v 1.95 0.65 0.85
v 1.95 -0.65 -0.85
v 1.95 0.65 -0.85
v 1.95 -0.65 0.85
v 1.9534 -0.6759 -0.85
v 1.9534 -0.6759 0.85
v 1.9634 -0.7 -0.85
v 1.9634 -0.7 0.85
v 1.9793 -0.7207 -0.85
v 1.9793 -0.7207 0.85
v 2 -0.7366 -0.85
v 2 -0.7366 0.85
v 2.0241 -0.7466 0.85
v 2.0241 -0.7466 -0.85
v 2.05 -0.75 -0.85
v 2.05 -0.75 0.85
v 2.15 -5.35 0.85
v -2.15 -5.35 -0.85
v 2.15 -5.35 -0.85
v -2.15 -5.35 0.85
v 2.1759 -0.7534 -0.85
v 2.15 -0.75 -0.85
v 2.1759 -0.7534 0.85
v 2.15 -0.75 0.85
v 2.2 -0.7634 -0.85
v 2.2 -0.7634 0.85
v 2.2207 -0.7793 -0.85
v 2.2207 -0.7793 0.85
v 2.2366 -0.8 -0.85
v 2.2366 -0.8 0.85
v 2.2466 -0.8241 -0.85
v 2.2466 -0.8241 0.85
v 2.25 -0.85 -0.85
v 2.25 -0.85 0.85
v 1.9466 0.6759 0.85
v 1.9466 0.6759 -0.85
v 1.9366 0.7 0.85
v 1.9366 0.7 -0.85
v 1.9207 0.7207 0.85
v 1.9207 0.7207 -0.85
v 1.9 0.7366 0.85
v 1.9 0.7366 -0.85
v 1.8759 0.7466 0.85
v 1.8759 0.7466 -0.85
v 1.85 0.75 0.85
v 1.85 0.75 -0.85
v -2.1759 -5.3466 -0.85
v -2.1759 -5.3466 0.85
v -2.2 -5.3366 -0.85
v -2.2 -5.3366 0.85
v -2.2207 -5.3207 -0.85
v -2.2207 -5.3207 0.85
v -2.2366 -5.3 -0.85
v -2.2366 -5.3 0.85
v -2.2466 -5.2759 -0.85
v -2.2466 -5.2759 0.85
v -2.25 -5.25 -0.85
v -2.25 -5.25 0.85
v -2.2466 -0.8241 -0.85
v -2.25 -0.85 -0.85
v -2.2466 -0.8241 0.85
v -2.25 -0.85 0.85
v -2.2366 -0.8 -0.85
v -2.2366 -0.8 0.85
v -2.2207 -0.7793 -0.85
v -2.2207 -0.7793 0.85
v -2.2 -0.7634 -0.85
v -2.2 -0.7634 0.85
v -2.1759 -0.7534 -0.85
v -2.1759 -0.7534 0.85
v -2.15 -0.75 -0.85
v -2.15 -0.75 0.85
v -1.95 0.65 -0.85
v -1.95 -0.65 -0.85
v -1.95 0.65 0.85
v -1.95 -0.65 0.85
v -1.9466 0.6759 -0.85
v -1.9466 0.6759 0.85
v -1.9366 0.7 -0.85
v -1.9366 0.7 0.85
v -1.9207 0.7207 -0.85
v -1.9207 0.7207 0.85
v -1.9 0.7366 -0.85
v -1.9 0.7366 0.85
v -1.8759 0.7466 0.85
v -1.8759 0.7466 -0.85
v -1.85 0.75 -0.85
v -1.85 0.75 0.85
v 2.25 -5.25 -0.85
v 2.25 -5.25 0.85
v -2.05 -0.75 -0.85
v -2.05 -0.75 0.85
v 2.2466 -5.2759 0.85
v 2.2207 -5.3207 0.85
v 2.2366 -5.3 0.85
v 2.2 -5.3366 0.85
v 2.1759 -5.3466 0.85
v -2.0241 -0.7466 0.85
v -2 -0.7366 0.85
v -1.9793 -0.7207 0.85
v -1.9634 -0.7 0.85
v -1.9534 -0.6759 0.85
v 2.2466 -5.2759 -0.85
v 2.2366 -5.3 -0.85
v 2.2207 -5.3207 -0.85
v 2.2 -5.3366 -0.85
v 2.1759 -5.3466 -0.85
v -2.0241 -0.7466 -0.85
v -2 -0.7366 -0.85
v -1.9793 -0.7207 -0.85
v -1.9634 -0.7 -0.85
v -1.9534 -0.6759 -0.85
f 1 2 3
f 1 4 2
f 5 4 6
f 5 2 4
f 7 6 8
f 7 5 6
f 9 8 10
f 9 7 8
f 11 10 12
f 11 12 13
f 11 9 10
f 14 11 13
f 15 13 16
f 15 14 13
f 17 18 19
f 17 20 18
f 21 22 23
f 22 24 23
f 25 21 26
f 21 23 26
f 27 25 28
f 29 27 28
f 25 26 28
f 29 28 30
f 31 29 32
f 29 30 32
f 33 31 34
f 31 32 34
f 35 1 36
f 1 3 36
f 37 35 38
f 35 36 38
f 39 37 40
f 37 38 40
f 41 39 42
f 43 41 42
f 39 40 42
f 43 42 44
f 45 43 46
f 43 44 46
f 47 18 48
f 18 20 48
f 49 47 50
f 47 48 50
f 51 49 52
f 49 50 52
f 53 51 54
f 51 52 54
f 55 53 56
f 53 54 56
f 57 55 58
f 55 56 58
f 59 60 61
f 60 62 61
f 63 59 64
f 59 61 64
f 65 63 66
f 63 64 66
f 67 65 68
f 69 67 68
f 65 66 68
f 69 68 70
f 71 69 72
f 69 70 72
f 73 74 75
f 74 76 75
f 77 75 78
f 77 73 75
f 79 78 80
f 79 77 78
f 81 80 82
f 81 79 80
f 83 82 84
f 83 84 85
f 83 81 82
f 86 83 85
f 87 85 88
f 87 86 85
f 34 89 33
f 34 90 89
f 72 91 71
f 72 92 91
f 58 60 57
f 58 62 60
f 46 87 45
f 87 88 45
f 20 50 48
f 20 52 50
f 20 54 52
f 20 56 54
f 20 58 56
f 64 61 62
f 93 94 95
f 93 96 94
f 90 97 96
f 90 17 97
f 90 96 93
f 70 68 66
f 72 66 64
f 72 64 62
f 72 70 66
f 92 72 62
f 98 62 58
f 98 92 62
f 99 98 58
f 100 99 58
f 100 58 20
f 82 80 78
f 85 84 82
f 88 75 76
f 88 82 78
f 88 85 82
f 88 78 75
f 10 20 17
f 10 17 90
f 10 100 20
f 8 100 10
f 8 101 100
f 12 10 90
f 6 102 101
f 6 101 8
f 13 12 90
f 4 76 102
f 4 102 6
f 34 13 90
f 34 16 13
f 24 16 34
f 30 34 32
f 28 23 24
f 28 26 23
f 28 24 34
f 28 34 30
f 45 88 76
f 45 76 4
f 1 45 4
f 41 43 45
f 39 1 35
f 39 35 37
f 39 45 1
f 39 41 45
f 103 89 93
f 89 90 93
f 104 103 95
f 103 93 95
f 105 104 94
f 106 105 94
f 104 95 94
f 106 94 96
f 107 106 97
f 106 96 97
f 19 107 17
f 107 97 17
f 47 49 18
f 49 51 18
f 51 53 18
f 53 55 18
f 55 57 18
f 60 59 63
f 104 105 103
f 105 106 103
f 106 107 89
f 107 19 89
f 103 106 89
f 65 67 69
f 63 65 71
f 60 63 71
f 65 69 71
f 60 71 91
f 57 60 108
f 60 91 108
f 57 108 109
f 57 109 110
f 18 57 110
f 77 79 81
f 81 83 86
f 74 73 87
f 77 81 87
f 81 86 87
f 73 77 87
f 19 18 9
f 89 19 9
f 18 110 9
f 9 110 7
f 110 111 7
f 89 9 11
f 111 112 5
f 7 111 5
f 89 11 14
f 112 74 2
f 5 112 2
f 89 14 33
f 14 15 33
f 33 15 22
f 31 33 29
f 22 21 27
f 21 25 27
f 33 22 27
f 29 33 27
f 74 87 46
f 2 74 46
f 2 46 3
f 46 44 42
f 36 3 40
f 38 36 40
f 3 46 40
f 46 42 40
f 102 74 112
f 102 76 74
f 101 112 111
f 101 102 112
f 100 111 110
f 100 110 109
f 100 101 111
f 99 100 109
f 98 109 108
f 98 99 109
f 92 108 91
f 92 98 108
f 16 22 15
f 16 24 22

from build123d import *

# Parameters (mm, degrees)
SKETCH_1_W      = 3.9
SKETCH_1_H      = 1.5
EXTRUDE_1_DEPTH = 0.85
FILLET_1_R      = 0.1


with BuildPart() as part:
    # 草图1 → 凸台-拉伸1 (new, symmetric)
    with BuildSketch(Plane.XY):
        Rectangle(SKETCH_1_W, SKETCH_1_H)
        Polygon((1.95, -0.75), (-1.95, -0.75), (-2.25, -0.75), (-2.25, -5.35), (2.25, -5.35), (2.25, -0.75), align=None)
    extrude(amount=EXTRUDE_1_DEPTH, both=True)

    # 圆角1
    fillet_1_edges = [part.edges().sort_by_distance(p)[0] for p in [
        (1.95, -0.75, 0),
        (2.25, -0.75, 0),
        (2.25, -5.35, 0),
        (-2.25, -5.35, 0),
        (-2.25, -0.75, 0),
        (-1.95, -0.75, 0),
        (-1.95, 0.75, 0),
        (1.95, 0.75, 0),
    ]]
    fillet(fillet_1_edges, radius=FILLET_1_R)


solid = part.part
